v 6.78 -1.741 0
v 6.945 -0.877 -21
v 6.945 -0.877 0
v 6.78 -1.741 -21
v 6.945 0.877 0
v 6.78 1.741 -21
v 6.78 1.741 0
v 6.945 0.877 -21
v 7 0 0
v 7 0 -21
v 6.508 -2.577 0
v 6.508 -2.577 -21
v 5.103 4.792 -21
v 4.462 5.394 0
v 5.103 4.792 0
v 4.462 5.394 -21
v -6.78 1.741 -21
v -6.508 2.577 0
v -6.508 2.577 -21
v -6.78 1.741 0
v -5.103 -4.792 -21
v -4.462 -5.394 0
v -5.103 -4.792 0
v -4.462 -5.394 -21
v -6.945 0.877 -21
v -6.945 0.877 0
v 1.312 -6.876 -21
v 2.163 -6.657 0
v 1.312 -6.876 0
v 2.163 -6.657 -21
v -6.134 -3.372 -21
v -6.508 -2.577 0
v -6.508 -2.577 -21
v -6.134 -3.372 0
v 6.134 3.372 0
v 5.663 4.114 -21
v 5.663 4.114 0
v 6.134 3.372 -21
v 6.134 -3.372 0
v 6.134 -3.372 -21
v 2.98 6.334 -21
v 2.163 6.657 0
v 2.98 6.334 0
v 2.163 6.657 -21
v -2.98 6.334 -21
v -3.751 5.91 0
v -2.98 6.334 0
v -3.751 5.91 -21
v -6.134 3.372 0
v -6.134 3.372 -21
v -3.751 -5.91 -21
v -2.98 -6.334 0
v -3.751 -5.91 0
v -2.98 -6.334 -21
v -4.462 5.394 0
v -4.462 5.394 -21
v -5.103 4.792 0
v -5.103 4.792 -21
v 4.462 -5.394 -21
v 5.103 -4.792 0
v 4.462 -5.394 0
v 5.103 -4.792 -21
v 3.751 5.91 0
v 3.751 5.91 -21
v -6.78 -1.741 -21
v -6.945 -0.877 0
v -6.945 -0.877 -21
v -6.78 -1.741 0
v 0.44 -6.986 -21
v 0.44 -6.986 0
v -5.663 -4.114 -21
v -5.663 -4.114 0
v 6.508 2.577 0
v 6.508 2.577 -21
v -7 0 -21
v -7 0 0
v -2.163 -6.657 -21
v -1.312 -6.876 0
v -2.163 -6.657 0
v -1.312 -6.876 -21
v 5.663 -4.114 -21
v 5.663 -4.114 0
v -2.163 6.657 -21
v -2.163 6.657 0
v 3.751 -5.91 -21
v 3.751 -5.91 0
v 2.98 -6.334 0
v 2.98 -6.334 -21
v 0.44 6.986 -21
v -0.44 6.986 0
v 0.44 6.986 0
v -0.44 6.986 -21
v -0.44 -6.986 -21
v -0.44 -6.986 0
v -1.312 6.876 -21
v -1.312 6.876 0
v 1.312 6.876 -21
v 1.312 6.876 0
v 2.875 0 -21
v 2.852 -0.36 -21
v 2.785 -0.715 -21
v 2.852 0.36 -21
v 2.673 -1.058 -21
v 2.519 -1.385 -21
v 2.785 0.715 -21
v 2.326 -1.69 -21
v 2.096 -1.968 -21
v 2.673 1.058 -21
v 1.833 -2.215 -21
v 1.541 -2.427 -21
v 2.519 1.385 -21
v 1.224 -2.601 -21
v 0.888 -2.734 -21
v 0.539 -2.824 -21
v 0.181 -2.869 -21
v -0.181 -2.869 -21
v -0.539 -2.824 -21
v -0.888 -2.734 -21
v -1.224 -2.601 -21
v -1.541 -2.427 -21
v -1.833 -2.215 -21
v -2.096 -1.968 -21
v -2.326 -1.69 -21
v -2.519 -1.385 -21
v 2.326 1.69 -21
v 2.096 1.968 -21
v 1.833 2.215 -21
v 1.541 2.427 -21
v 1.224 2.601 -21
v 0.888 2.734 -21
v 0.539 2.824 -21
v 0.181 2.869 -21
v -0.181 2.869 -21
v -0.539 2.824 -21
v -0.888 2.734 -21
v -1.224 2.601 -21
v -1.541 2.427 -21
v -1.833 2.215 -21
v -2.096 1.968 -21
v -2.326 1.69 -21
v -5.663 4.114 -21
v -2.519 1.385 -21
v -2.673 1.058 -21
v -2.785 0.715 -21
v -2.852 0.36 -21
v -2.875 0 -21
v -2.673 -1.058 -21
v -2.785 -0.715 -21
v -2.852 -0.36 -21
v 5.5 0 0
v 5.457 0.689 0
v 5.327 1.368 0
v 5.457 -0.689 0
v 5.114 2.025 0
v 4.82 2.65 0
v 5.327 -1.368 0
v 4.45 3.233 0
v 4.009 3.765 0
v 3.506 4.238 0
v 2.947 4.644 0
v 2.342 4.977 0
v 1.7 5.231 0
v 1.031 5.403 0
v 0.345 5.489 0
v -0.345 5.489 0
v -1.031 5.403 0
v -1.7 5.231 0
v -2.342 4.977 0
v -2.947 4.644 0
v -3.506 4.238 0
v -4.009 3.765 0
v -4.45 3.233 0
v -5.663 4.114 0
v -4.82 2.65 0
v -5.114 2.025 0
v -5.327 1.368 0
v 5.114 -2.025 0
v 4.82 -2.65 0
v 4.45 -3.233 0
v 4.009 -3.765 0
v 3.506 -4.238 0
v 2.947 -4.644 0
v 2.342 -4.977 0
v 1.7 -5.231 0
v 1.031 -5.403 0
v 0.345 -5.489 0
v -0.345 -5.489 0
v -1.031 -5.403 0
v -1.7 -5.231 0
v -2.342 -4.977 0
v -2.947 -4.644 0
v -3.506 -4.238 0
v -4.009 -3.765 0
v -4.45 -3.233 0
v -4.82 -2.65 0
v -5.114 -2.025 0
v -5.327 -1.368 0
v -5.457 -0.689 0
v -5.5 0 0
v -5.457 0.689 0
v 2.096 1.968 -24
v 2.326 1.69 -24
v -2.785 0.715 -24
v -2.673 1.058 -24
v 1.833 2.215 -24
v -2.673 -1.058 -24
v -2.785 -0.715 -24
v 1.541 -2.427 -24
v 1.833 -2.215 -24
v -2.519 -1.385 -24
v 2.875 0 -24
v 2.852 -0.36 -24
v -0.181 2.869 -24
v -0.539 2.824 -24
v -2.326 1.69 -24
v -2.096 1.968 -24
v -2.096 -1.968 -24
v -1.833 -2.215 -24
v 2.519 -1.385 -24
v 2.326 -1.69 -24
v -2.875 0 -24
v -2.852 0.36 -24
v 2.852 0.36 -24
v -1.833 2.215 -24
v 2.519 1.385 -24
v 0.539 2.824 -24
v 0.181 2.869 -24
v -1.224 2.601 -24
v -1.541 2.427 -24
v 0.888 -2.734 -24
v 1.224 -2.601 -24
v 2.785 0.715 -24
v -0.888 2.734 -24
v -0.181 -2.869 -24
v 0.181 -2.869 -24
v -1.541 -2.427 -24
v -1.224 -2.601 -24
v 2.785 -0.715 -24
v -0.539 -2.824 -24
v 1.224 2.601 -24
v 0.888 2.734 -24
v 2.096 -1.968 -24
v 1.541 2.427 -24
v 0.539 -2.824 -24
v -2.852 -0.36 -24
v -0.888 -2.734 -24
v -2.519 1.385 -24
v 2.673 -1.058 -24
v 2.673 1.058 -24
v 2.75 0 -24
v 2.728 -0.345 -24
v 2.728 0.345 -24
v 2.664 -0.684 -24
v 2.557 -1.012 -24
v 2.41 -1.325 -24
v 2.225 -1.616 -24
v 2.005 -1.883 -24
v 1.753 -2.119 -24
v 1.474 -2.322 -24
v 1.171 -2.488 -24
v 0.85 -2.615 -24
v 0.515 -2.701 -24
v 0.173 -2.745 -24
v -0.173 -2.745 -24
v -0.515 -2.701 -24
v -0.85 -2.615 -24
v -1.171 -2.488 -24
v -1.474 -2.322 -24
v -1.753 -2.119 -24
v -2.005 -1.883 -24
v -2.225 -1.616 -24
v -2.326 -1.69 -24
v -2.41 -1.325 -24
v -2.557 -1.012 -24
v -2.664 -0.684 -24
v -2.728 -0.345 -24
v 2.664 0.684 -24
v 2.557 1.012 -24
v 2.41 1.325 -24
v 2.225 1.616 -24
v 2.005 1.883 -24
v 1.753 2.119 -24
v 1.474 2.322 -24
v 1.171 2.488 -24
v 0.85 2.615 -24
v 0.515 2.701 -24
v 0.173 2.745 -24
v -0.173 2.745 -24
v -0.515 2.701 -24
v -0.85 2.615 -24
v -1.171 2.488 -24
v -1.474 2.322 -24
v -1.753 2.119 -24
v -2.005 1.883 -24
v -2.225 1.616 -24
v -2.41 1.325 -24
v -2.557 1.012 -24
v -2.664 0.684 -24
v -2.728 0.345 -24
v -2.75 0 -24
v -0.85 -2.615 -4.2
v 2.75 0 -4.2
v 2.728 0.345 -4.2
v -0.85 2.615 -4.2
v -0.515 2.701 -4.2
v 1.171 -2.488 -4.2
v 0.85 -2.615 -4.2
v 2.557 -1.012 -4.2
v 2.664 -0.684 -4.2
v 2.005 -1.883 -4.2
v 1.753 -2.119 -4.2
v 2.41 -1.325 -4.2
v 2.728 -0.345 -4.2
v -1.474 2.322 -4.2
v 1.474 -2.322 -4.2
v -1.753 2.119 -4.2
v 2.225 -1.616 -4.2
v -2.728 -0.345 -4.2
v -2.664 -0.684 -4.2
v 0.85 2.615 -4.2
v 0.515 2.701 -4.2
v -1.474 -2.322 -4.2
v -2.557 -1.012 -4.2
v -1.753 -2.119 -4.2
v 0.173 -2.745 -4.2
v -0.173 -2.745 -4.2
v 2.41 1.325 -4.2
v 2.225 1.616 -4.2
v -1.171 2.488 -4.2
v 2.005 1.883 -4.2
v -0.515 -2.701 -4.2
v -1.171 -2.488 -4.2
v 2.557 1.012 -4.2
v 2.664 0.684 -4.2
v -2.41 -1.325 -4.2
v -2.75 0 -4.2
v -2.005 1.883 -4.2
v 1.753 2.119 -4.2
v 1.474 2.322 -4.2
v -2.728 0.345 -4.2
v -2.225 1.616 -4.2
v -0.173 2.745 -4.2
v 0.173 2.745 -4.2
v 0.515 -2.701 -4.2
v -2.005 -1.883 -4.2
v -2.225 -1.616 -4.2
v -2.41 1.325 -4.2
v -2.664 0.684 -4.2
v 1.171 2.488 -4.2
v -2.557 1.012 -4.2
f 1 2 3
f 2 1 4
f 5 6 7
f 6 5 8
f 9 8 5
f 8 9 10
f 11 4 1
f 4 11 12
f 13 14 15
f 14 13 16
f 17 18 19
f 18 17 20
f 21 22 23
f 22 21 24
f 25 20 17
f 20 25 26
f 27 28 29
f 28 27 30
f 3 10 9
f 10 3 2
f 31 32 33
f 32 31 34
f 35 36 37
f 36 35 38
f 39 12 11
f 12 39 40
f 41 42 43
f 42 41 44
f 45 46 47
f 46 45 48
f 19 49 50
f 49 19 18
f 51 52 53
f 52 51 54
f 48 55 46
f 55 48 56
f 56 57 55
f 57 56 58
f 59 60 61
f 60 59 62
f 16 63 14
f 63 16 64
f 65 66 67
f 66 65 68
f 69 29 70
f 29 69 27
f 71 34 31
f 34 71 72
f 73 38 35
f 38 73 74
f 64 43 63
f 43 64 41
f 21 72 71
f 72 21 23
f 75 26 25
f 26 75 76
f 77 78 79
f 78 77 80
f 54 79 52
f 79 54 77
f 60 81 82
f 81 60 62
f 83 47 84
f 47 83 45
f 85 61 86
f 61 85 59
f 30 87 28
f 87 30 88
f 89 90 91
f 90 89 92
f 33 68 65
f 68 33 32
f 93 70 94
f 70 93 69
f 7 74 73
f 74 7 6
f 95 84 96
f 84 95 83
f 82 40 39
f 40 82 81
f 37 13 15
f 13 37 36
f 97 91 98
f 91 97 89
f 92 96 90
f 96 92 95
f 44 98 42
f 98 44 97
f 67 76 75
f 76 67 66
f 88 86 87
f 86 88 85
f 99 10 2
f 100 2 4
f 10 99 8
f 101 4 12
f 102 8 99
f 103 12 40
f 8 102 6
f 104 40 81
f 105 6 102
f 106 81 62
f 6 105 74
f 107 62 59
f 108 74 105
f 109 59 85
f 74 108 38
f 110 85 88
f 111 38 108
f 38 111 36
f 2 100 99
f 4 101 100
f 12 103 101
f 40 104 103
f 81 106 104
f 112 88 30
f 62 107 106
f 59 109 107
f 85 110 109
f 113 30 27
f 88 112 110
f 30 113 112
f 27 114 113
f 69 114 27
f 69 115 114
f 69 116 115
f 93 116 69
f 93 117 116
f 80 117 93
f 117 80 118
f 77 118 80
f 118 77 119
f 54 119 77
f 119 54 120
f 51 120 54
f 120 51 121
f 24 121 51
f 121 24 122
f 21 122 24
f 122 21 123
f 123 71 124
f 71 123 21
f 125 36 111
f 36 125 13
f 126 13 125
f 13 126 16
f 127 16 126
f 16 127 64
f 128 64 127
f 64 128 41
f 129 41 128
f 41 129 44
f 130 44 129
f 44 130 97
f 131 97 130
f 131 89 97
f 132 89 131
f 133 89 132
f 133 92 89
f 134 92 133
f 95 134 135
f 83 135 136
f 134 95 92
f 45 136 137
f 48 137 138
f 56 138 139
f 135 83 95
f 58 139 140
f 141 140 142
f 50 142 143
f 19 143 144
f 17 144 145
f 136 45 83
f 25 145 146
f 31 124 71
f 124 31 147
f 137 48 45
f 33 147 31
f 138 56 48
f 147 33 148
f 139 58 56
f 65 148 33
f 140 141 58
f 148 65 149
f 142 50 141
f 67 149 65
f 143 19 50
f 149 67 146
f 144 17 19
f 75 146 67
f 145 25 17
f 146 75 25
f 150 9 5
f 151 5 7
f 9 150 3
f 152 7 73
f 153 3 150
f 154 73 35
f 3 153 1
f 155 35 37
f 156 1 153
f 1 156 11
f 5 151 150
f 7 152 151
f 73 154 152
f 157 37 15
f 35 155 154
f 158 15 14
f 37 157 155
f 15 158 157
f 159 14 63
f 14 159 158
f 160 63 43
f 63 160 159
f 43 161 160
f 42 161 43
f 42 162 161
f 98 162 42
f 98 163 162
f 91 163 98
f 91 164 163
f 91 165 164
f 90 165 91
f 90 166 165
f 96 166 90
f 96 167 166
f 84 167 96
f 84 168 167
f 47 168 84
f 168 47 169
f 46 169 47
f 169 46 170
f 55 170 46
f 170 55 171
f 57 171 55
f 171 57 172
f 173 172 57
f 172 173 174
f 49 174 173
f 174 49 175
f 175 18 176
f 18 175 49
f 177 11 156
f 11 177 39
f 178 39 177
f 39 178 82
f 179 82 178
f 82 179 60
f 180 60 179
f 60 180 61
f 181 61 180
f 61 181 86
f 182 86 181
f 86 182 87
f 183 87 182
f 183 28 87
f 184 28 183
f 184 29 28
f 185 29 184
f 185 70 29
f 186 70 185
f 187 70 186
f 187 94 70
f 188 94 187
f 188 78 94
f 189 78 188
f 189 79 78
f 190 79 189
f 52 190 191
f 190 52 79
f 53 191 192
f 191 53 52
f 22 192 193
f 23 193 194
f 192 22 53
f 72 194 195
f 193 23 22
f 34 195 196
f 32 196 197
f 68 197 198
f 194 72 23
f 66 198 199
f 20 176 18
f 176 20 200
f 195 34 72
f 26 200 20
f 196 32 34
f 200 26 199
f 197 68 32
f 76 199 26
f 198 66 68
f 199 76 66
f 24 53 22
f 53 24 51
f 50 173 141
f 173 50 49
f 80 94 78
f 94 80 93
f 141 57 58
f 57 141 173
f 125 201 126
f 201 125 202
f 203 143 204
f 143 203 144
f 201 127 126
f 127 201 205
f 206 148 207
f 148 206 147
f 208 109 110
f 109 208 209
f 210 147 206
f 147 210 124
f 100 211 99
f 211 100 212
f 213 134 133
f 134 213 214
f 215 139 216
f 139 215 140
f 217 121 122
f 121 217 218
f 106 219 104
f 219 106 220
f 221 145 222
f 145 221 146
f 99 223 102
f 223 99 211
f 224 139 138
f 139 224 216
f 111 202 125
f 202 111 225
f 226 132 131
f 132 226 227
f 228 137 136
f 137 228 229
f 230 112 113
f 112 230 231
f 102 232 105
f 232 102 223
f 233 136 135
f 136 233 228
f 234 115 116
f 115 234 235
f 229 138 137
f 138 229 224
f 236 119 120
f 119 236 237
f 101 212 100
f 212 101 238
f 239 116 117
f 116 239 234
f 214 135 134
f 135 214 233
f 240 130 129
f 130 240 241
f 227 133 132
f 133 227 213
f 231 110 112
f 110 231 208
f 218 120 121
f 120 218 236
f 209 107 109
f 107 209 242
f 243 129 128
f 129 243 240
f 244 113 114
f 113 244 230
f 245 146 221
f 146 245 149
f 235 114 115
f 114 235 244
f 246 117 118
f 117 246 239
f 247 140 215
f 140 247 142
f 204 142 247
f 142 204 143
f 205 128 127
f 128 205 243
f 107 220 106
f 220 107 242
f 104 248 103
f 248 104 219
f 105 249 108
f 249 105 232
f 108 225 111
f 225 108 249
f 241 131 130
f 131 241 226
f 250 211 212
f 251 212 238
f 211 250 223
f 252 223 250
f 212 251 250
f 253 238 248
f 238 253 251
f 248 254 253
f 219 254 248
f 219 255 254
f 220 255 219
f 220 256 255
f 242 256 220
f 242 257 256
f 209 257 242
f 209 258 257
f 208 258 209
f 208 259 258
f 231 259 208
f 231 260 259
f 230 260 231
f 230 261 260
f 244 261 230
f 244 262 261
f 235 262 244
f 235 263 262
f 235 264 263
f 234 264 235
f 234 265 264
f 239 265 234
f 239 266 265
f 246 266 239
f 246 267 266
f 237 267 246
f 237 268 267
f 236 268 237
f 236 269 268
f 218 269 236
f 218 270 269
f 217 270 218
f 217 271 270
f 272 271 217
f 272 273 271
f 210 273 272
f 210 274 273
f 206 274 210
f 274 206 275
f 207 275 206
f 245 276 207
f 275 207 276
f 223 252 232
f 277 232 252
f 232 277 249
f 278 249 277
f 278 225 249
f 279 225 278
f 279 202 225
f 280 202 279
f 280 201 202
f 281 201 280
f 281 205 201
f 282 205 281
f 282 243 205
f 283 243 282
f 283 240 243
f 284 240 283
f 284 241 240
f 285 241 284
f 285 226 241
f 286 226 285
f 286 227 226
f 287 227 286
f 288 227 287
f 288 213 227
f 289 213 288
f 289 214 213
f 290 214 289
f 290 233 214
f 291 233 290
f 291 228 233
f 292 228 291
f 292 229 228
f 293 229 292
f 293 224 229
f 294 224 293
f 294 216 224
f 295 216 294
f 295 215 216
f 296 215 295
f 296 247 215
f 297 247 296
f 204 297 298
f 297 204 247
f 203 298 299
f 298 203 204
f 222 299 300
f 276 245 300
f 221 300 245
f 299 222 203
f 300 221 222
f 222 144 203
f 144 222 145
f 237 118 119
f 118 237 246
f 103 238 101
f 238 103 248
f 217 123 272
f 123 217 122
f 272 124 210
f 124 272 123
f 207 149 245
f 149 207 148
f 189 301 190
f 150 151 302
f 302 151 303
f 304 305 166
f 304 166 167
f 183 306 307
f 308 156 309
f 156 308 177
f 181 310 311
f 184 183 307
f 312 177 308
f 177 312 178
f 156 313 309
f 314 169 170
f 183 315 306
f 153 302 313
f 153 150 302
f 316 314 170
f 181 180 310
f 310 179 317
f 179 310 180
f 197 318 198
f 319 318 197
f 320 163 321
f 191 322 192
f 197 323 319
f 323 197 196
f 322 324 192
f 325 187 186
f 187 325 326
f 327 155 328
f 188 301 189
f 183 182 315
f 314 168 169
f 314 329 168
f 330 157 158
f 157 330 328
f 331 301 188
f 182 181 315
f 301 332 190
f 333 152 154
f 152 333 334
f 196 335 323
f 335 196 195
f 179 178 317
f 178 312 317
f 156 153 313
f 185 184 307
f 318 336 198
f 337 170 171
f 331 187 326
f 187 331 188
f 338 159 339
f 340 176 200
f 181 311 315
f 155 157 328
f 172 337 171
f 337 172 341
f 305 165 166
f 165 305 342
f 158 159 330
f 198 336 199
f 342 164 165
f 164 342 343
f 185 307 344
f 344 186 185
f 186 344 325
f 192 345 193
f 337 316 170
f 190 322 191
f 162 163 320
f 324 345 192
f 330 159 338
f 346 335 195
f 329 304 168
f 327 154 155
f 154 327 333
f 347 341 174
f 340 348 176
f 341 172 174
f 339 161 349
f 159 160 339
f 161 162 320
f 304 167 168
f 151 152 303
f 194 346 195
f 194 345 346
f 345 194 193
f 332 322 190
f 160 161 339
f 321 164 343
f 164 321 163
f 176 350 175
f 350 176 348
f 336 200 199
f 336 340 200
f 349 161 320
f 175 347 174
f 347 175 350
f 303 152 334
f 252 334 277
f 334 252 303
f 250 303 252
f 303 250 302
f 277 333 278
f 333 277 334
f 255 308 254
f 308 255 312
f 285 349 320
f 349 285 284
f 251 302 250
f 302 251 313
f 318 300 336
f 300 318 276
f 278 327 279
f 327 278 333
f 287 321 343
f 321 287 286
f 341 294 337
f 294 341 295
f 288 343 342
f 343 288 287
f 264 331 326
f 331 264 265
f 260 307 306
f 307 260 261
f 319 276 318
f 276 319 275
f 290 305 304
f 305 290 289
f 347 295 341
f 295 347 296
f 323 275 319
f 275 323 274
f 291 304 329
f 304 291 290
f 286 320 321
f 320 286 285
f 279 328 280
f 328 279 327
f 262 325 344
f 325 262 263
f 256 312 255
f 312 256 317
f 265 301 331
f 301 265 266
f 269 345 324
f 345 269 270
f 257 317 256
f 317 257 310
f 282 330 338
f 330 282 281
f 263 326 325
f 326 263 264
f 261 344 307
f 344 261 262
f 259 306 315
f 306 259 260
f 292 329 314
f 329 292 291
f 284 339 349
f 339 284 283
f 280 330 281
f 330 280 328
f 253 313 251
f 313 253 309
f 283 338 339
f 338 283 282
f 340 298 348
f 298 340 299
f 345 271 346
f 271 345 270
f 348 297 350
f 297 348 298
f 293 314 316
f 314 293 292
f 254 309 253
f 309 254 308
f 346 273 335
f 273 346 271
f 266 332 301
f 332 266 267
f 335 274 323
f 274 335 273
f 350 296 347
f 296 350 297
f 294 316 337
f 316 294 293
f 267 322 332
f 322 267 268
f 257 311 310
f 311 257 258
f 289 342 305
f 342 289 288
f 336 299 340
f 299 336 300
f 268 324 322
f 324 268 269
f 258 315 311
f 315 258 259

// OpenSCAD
$fn = 50;

difference() {
	union() {
		translate(v = [0, 0, -21.0]) {
			cylinder(h = 21, r = 7.0);
		}
		#translate(v = [0, 0, -24.0]) {
			cylinder(h = 24, r = 2.875);
		}
	}
	union() {
		translate(v = [0, 0, 0]) {
			rotate(a = [0, 0, 0]) {
				difference() {
					union() {
						translate(v = [0, 0, -24.0]) {
							cylinder(h = 24, r = 2.25);
						}
						translate(v = [0, 0, -4.2]) {
							cylinder(h = 4.2, r1 = 2.75, r2 = 5.5);
						}
						translate(v = [0, 0, -24.0]) {
							cylinder(h = 24, r = 2.75);
						}
						translate(v = [0, 0, -24.0]) {
							cylinder(h = 24, r = 2.25);
						}
					}
					union();
				}
			}
		}
	}
}
